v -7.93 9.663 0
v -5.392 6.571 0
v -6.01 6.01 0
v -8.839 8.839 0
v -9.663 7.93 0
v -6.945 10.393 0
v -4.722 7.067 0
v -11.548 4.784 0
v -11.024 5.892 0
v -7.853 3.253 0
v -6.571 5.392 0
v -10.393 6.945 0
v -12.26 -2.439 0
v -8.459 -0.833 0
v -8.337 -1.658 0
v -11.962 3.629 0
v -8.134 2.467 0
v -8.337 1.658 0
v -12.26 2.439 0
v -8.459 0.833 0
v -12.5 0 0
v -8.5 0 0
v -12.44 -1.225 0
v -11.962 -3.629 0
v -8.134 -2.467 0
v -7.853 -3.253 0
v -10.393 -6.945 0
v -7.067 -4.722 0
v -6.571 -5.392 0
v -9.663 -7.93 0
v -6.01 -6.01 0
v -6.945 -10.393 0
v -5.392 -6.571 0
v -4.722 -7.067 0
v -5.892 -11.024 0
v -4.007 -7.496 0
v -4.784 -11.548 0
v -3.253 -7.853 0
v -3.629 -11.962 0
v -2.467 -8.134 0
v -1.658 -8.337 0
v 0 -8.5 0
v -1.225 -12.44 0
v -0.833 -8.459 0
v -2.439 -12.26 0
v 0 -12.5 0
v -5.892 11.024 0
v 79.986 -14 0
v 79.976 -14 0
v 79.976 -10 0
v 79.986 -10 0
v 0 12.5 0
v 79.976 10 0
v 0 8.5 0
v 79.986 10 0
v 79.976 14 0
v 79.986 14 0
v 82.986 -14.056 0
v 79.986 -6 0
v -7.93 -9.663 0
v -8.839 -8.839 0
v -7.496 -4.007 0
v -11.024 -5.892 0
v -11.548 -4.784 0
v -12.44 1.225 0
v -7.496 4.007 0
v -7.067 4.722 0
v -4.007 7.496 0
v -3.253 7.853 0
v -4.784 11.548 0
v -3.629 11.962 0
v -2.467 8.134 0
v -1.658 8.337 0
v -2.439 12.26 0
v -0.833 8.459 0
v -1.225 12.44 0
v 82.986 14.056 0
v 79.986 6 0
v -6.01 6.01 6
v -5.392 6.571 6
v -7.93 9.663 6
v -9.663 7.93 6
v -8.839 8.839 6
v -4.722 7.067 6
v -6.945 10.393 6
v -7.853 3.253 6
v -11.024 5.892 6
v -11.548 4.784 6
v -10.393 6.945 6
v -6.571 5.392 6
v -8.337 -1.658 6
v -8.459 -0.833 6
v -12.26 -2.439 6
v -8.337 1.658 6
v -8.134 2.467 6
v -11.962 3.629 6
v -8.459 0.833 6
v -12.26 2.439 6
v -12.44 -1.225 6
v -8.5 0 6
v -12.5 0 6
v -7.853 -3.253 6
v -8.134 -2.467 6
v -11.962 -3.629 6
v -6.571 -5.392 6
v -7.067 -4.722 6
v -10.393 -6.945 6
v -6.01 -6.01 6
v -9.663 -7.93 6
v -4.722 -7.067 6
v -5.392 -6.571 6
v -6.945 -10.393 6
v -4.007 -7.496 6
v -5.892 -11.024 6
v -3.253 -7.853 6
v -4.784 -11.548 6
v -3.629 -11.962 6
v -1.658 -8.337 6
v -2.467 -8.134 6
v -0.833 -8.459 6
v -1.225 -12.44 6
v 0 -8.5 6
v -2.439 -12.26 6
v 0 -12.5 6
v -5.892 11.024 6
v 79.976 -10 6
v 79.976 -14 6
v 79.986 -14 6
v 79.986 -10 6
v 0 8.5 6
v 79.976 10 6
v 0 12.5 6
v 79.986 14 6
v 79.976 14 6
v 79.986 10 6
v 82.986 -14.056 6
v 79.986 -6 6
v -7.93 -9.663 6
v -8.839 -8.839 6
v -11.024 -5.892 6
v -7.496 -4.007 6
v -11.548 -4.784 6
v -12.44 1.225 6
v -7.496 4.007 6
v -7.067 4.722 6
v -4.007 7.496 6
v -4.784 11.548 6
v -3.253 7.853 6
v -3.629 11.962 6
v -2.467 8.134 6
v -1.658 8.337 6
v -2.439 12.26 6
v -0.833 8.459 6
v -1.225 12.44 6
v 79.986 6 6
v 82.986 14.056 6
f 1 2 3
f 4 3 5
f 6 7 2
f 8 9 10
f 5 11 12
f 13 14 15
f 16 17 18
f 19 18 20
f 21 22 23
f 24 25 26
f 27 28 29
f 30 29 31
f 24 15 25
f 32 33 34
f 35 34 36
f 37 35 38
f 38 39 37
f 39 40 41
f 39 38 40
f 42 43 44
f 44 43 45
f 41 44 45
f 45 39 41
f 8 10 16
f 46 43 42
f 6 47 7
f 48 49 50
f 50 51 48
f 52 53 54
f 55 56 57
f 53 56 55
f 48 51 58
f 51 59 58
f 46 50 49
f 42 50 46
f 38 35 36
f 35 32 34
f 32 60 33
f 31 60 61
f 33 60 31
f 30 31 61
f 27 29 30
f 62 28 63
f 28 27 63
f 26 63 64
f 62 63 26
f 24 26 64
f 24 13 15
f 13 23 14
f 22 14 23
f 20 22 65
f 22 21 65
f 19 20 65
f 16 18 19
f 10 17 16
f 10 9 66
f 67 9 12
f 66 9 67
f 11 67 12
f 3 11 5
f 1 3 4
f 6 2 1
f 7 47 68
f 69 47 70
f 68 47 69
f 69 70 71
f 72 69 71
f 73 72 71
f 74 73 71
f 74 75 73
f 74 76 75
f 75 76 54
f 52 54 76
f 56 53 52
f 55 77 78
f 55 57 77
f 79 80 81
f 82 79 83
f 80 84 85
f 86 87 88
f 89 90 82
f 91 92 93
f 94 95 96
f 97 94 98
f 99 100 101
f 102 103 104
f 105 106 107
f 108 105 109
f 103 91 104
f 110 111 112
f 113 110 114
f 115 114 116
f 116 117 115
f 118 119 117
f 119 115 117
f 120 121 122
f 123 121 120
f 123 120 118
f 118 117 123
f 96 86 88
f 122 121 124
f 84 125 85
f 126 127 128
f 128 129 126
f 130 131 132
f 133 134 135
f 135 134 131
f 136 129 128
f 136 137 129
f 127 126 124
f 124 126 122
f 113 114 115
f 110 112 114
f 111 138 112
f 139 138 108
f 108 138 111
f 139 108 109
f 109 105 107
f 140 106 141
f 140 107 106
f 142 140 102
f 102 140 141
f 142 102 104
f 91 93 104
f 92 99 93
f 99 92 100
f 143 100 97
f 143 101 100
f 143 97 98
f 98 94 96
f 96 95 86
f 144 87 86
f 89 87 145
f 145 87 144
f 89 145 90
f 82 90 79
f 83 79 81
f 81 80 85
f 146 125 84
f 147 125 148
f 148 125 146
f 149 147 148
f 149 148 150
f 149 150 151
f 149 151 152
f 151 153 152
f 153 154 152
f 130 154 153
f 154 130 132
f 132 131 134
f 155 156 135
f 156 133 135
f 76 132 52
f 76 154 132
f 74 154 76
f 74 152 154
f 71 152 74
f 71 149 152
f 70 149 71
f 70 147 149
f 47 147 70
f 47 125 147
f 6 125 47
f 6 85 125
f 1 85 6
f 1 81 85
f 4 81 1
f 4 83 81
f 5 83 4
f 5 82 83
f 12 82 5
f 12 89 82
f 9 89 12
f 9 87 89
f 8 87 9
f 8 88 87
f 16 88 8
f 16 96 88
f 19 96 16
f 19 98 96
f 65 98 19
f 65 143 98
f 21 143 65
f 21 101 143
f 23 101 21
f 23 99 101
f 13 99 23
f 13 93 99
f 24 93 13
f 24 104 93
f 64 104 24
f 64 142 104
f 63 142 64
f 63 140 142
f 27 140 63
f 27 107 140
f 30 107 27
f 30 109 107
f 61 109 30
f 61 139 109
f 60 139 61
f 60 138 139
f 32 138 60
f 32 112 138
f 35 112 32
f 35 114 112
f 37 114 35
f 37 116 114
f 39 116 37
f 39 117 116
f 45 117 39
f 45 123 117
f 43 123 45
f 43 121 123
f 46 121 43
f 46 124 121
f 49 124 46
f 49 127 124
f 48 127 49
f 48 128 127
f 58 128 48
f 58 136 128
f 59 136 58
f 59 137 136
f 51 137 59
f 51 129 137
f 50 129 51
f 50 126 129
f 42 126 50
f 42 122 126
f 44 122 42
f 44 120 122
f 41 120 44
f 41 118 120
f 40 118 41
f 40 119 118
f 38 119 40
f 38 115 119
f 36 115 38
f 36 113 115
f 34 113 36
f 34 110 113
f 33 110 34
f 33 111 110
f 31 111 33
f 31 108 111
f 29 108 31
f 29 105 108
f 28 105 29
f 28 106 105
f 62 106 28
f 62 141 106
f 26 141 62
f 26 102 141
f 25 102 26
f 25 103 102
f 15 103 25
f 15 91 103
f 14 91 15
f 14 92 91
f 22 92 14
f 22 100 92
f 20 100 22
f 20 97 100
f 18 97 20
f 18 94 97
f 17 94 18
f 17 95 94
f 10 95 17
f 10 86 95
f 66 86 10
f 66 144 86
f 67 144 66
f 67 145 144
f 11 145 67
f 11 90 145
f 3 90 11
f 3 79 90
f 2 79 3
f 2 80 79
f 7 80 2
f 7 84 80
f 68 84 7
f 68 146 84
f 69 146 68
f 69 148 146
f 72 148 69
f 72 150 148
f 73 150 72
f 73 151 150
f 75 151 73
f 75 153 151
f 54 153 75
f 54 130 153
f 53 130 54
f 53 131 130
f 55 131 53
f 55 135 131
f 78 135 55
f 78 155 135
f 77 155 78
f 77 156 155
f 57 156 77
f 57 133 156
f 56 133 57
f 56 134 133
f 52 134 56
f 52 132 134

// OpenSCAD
//connection circle diameter (диаметр внешнего круга)
cd=25;

//width of handles (толщина стенок)
w=4;

//length on handles (длина ручек)
l=80;

//tip length (длина губок)
tip=4;


//tip width (ширина губок)
tipw=3;


//twizers thick (толщина пинцета)
h=6;


//main size between ends (расстояние между концами без учета выступов)
max_w=28; 

ang=asin(((max_w-cd)/2)/l);
echo (ang);
//ang=10;//угол разведения ручек


$fn=64;
module tip(){
    polygon([[l*cos(ang)+tipw,endp+tipw*sin(ang)],[l*cos(ang),endp-tip-w],[l*cos(ang),endp]]);
}

endp=(cd+l*sin(ang)*2)*0.5;//точка луча конечная
linear_extrude(h){
    difference(){
        hull(){
            circle(d=cd);
            translate([l*cos(ang)-0.01,-(cd+l*sin(ang)*2)*0.5])square([0.01,cd+l*sin(ang)*2]);
        }
        hull(){
            circle(d=cd-w*2);
            translate([l*cos(ang)-0.01,-(cd+l*sin(ang)*2)*0.5+w])square([0.01,cd+l*sin(ang)*2-w*2]);
        }
        
    }
    tip();
    mirror([0,1,0])tip();
}
    
